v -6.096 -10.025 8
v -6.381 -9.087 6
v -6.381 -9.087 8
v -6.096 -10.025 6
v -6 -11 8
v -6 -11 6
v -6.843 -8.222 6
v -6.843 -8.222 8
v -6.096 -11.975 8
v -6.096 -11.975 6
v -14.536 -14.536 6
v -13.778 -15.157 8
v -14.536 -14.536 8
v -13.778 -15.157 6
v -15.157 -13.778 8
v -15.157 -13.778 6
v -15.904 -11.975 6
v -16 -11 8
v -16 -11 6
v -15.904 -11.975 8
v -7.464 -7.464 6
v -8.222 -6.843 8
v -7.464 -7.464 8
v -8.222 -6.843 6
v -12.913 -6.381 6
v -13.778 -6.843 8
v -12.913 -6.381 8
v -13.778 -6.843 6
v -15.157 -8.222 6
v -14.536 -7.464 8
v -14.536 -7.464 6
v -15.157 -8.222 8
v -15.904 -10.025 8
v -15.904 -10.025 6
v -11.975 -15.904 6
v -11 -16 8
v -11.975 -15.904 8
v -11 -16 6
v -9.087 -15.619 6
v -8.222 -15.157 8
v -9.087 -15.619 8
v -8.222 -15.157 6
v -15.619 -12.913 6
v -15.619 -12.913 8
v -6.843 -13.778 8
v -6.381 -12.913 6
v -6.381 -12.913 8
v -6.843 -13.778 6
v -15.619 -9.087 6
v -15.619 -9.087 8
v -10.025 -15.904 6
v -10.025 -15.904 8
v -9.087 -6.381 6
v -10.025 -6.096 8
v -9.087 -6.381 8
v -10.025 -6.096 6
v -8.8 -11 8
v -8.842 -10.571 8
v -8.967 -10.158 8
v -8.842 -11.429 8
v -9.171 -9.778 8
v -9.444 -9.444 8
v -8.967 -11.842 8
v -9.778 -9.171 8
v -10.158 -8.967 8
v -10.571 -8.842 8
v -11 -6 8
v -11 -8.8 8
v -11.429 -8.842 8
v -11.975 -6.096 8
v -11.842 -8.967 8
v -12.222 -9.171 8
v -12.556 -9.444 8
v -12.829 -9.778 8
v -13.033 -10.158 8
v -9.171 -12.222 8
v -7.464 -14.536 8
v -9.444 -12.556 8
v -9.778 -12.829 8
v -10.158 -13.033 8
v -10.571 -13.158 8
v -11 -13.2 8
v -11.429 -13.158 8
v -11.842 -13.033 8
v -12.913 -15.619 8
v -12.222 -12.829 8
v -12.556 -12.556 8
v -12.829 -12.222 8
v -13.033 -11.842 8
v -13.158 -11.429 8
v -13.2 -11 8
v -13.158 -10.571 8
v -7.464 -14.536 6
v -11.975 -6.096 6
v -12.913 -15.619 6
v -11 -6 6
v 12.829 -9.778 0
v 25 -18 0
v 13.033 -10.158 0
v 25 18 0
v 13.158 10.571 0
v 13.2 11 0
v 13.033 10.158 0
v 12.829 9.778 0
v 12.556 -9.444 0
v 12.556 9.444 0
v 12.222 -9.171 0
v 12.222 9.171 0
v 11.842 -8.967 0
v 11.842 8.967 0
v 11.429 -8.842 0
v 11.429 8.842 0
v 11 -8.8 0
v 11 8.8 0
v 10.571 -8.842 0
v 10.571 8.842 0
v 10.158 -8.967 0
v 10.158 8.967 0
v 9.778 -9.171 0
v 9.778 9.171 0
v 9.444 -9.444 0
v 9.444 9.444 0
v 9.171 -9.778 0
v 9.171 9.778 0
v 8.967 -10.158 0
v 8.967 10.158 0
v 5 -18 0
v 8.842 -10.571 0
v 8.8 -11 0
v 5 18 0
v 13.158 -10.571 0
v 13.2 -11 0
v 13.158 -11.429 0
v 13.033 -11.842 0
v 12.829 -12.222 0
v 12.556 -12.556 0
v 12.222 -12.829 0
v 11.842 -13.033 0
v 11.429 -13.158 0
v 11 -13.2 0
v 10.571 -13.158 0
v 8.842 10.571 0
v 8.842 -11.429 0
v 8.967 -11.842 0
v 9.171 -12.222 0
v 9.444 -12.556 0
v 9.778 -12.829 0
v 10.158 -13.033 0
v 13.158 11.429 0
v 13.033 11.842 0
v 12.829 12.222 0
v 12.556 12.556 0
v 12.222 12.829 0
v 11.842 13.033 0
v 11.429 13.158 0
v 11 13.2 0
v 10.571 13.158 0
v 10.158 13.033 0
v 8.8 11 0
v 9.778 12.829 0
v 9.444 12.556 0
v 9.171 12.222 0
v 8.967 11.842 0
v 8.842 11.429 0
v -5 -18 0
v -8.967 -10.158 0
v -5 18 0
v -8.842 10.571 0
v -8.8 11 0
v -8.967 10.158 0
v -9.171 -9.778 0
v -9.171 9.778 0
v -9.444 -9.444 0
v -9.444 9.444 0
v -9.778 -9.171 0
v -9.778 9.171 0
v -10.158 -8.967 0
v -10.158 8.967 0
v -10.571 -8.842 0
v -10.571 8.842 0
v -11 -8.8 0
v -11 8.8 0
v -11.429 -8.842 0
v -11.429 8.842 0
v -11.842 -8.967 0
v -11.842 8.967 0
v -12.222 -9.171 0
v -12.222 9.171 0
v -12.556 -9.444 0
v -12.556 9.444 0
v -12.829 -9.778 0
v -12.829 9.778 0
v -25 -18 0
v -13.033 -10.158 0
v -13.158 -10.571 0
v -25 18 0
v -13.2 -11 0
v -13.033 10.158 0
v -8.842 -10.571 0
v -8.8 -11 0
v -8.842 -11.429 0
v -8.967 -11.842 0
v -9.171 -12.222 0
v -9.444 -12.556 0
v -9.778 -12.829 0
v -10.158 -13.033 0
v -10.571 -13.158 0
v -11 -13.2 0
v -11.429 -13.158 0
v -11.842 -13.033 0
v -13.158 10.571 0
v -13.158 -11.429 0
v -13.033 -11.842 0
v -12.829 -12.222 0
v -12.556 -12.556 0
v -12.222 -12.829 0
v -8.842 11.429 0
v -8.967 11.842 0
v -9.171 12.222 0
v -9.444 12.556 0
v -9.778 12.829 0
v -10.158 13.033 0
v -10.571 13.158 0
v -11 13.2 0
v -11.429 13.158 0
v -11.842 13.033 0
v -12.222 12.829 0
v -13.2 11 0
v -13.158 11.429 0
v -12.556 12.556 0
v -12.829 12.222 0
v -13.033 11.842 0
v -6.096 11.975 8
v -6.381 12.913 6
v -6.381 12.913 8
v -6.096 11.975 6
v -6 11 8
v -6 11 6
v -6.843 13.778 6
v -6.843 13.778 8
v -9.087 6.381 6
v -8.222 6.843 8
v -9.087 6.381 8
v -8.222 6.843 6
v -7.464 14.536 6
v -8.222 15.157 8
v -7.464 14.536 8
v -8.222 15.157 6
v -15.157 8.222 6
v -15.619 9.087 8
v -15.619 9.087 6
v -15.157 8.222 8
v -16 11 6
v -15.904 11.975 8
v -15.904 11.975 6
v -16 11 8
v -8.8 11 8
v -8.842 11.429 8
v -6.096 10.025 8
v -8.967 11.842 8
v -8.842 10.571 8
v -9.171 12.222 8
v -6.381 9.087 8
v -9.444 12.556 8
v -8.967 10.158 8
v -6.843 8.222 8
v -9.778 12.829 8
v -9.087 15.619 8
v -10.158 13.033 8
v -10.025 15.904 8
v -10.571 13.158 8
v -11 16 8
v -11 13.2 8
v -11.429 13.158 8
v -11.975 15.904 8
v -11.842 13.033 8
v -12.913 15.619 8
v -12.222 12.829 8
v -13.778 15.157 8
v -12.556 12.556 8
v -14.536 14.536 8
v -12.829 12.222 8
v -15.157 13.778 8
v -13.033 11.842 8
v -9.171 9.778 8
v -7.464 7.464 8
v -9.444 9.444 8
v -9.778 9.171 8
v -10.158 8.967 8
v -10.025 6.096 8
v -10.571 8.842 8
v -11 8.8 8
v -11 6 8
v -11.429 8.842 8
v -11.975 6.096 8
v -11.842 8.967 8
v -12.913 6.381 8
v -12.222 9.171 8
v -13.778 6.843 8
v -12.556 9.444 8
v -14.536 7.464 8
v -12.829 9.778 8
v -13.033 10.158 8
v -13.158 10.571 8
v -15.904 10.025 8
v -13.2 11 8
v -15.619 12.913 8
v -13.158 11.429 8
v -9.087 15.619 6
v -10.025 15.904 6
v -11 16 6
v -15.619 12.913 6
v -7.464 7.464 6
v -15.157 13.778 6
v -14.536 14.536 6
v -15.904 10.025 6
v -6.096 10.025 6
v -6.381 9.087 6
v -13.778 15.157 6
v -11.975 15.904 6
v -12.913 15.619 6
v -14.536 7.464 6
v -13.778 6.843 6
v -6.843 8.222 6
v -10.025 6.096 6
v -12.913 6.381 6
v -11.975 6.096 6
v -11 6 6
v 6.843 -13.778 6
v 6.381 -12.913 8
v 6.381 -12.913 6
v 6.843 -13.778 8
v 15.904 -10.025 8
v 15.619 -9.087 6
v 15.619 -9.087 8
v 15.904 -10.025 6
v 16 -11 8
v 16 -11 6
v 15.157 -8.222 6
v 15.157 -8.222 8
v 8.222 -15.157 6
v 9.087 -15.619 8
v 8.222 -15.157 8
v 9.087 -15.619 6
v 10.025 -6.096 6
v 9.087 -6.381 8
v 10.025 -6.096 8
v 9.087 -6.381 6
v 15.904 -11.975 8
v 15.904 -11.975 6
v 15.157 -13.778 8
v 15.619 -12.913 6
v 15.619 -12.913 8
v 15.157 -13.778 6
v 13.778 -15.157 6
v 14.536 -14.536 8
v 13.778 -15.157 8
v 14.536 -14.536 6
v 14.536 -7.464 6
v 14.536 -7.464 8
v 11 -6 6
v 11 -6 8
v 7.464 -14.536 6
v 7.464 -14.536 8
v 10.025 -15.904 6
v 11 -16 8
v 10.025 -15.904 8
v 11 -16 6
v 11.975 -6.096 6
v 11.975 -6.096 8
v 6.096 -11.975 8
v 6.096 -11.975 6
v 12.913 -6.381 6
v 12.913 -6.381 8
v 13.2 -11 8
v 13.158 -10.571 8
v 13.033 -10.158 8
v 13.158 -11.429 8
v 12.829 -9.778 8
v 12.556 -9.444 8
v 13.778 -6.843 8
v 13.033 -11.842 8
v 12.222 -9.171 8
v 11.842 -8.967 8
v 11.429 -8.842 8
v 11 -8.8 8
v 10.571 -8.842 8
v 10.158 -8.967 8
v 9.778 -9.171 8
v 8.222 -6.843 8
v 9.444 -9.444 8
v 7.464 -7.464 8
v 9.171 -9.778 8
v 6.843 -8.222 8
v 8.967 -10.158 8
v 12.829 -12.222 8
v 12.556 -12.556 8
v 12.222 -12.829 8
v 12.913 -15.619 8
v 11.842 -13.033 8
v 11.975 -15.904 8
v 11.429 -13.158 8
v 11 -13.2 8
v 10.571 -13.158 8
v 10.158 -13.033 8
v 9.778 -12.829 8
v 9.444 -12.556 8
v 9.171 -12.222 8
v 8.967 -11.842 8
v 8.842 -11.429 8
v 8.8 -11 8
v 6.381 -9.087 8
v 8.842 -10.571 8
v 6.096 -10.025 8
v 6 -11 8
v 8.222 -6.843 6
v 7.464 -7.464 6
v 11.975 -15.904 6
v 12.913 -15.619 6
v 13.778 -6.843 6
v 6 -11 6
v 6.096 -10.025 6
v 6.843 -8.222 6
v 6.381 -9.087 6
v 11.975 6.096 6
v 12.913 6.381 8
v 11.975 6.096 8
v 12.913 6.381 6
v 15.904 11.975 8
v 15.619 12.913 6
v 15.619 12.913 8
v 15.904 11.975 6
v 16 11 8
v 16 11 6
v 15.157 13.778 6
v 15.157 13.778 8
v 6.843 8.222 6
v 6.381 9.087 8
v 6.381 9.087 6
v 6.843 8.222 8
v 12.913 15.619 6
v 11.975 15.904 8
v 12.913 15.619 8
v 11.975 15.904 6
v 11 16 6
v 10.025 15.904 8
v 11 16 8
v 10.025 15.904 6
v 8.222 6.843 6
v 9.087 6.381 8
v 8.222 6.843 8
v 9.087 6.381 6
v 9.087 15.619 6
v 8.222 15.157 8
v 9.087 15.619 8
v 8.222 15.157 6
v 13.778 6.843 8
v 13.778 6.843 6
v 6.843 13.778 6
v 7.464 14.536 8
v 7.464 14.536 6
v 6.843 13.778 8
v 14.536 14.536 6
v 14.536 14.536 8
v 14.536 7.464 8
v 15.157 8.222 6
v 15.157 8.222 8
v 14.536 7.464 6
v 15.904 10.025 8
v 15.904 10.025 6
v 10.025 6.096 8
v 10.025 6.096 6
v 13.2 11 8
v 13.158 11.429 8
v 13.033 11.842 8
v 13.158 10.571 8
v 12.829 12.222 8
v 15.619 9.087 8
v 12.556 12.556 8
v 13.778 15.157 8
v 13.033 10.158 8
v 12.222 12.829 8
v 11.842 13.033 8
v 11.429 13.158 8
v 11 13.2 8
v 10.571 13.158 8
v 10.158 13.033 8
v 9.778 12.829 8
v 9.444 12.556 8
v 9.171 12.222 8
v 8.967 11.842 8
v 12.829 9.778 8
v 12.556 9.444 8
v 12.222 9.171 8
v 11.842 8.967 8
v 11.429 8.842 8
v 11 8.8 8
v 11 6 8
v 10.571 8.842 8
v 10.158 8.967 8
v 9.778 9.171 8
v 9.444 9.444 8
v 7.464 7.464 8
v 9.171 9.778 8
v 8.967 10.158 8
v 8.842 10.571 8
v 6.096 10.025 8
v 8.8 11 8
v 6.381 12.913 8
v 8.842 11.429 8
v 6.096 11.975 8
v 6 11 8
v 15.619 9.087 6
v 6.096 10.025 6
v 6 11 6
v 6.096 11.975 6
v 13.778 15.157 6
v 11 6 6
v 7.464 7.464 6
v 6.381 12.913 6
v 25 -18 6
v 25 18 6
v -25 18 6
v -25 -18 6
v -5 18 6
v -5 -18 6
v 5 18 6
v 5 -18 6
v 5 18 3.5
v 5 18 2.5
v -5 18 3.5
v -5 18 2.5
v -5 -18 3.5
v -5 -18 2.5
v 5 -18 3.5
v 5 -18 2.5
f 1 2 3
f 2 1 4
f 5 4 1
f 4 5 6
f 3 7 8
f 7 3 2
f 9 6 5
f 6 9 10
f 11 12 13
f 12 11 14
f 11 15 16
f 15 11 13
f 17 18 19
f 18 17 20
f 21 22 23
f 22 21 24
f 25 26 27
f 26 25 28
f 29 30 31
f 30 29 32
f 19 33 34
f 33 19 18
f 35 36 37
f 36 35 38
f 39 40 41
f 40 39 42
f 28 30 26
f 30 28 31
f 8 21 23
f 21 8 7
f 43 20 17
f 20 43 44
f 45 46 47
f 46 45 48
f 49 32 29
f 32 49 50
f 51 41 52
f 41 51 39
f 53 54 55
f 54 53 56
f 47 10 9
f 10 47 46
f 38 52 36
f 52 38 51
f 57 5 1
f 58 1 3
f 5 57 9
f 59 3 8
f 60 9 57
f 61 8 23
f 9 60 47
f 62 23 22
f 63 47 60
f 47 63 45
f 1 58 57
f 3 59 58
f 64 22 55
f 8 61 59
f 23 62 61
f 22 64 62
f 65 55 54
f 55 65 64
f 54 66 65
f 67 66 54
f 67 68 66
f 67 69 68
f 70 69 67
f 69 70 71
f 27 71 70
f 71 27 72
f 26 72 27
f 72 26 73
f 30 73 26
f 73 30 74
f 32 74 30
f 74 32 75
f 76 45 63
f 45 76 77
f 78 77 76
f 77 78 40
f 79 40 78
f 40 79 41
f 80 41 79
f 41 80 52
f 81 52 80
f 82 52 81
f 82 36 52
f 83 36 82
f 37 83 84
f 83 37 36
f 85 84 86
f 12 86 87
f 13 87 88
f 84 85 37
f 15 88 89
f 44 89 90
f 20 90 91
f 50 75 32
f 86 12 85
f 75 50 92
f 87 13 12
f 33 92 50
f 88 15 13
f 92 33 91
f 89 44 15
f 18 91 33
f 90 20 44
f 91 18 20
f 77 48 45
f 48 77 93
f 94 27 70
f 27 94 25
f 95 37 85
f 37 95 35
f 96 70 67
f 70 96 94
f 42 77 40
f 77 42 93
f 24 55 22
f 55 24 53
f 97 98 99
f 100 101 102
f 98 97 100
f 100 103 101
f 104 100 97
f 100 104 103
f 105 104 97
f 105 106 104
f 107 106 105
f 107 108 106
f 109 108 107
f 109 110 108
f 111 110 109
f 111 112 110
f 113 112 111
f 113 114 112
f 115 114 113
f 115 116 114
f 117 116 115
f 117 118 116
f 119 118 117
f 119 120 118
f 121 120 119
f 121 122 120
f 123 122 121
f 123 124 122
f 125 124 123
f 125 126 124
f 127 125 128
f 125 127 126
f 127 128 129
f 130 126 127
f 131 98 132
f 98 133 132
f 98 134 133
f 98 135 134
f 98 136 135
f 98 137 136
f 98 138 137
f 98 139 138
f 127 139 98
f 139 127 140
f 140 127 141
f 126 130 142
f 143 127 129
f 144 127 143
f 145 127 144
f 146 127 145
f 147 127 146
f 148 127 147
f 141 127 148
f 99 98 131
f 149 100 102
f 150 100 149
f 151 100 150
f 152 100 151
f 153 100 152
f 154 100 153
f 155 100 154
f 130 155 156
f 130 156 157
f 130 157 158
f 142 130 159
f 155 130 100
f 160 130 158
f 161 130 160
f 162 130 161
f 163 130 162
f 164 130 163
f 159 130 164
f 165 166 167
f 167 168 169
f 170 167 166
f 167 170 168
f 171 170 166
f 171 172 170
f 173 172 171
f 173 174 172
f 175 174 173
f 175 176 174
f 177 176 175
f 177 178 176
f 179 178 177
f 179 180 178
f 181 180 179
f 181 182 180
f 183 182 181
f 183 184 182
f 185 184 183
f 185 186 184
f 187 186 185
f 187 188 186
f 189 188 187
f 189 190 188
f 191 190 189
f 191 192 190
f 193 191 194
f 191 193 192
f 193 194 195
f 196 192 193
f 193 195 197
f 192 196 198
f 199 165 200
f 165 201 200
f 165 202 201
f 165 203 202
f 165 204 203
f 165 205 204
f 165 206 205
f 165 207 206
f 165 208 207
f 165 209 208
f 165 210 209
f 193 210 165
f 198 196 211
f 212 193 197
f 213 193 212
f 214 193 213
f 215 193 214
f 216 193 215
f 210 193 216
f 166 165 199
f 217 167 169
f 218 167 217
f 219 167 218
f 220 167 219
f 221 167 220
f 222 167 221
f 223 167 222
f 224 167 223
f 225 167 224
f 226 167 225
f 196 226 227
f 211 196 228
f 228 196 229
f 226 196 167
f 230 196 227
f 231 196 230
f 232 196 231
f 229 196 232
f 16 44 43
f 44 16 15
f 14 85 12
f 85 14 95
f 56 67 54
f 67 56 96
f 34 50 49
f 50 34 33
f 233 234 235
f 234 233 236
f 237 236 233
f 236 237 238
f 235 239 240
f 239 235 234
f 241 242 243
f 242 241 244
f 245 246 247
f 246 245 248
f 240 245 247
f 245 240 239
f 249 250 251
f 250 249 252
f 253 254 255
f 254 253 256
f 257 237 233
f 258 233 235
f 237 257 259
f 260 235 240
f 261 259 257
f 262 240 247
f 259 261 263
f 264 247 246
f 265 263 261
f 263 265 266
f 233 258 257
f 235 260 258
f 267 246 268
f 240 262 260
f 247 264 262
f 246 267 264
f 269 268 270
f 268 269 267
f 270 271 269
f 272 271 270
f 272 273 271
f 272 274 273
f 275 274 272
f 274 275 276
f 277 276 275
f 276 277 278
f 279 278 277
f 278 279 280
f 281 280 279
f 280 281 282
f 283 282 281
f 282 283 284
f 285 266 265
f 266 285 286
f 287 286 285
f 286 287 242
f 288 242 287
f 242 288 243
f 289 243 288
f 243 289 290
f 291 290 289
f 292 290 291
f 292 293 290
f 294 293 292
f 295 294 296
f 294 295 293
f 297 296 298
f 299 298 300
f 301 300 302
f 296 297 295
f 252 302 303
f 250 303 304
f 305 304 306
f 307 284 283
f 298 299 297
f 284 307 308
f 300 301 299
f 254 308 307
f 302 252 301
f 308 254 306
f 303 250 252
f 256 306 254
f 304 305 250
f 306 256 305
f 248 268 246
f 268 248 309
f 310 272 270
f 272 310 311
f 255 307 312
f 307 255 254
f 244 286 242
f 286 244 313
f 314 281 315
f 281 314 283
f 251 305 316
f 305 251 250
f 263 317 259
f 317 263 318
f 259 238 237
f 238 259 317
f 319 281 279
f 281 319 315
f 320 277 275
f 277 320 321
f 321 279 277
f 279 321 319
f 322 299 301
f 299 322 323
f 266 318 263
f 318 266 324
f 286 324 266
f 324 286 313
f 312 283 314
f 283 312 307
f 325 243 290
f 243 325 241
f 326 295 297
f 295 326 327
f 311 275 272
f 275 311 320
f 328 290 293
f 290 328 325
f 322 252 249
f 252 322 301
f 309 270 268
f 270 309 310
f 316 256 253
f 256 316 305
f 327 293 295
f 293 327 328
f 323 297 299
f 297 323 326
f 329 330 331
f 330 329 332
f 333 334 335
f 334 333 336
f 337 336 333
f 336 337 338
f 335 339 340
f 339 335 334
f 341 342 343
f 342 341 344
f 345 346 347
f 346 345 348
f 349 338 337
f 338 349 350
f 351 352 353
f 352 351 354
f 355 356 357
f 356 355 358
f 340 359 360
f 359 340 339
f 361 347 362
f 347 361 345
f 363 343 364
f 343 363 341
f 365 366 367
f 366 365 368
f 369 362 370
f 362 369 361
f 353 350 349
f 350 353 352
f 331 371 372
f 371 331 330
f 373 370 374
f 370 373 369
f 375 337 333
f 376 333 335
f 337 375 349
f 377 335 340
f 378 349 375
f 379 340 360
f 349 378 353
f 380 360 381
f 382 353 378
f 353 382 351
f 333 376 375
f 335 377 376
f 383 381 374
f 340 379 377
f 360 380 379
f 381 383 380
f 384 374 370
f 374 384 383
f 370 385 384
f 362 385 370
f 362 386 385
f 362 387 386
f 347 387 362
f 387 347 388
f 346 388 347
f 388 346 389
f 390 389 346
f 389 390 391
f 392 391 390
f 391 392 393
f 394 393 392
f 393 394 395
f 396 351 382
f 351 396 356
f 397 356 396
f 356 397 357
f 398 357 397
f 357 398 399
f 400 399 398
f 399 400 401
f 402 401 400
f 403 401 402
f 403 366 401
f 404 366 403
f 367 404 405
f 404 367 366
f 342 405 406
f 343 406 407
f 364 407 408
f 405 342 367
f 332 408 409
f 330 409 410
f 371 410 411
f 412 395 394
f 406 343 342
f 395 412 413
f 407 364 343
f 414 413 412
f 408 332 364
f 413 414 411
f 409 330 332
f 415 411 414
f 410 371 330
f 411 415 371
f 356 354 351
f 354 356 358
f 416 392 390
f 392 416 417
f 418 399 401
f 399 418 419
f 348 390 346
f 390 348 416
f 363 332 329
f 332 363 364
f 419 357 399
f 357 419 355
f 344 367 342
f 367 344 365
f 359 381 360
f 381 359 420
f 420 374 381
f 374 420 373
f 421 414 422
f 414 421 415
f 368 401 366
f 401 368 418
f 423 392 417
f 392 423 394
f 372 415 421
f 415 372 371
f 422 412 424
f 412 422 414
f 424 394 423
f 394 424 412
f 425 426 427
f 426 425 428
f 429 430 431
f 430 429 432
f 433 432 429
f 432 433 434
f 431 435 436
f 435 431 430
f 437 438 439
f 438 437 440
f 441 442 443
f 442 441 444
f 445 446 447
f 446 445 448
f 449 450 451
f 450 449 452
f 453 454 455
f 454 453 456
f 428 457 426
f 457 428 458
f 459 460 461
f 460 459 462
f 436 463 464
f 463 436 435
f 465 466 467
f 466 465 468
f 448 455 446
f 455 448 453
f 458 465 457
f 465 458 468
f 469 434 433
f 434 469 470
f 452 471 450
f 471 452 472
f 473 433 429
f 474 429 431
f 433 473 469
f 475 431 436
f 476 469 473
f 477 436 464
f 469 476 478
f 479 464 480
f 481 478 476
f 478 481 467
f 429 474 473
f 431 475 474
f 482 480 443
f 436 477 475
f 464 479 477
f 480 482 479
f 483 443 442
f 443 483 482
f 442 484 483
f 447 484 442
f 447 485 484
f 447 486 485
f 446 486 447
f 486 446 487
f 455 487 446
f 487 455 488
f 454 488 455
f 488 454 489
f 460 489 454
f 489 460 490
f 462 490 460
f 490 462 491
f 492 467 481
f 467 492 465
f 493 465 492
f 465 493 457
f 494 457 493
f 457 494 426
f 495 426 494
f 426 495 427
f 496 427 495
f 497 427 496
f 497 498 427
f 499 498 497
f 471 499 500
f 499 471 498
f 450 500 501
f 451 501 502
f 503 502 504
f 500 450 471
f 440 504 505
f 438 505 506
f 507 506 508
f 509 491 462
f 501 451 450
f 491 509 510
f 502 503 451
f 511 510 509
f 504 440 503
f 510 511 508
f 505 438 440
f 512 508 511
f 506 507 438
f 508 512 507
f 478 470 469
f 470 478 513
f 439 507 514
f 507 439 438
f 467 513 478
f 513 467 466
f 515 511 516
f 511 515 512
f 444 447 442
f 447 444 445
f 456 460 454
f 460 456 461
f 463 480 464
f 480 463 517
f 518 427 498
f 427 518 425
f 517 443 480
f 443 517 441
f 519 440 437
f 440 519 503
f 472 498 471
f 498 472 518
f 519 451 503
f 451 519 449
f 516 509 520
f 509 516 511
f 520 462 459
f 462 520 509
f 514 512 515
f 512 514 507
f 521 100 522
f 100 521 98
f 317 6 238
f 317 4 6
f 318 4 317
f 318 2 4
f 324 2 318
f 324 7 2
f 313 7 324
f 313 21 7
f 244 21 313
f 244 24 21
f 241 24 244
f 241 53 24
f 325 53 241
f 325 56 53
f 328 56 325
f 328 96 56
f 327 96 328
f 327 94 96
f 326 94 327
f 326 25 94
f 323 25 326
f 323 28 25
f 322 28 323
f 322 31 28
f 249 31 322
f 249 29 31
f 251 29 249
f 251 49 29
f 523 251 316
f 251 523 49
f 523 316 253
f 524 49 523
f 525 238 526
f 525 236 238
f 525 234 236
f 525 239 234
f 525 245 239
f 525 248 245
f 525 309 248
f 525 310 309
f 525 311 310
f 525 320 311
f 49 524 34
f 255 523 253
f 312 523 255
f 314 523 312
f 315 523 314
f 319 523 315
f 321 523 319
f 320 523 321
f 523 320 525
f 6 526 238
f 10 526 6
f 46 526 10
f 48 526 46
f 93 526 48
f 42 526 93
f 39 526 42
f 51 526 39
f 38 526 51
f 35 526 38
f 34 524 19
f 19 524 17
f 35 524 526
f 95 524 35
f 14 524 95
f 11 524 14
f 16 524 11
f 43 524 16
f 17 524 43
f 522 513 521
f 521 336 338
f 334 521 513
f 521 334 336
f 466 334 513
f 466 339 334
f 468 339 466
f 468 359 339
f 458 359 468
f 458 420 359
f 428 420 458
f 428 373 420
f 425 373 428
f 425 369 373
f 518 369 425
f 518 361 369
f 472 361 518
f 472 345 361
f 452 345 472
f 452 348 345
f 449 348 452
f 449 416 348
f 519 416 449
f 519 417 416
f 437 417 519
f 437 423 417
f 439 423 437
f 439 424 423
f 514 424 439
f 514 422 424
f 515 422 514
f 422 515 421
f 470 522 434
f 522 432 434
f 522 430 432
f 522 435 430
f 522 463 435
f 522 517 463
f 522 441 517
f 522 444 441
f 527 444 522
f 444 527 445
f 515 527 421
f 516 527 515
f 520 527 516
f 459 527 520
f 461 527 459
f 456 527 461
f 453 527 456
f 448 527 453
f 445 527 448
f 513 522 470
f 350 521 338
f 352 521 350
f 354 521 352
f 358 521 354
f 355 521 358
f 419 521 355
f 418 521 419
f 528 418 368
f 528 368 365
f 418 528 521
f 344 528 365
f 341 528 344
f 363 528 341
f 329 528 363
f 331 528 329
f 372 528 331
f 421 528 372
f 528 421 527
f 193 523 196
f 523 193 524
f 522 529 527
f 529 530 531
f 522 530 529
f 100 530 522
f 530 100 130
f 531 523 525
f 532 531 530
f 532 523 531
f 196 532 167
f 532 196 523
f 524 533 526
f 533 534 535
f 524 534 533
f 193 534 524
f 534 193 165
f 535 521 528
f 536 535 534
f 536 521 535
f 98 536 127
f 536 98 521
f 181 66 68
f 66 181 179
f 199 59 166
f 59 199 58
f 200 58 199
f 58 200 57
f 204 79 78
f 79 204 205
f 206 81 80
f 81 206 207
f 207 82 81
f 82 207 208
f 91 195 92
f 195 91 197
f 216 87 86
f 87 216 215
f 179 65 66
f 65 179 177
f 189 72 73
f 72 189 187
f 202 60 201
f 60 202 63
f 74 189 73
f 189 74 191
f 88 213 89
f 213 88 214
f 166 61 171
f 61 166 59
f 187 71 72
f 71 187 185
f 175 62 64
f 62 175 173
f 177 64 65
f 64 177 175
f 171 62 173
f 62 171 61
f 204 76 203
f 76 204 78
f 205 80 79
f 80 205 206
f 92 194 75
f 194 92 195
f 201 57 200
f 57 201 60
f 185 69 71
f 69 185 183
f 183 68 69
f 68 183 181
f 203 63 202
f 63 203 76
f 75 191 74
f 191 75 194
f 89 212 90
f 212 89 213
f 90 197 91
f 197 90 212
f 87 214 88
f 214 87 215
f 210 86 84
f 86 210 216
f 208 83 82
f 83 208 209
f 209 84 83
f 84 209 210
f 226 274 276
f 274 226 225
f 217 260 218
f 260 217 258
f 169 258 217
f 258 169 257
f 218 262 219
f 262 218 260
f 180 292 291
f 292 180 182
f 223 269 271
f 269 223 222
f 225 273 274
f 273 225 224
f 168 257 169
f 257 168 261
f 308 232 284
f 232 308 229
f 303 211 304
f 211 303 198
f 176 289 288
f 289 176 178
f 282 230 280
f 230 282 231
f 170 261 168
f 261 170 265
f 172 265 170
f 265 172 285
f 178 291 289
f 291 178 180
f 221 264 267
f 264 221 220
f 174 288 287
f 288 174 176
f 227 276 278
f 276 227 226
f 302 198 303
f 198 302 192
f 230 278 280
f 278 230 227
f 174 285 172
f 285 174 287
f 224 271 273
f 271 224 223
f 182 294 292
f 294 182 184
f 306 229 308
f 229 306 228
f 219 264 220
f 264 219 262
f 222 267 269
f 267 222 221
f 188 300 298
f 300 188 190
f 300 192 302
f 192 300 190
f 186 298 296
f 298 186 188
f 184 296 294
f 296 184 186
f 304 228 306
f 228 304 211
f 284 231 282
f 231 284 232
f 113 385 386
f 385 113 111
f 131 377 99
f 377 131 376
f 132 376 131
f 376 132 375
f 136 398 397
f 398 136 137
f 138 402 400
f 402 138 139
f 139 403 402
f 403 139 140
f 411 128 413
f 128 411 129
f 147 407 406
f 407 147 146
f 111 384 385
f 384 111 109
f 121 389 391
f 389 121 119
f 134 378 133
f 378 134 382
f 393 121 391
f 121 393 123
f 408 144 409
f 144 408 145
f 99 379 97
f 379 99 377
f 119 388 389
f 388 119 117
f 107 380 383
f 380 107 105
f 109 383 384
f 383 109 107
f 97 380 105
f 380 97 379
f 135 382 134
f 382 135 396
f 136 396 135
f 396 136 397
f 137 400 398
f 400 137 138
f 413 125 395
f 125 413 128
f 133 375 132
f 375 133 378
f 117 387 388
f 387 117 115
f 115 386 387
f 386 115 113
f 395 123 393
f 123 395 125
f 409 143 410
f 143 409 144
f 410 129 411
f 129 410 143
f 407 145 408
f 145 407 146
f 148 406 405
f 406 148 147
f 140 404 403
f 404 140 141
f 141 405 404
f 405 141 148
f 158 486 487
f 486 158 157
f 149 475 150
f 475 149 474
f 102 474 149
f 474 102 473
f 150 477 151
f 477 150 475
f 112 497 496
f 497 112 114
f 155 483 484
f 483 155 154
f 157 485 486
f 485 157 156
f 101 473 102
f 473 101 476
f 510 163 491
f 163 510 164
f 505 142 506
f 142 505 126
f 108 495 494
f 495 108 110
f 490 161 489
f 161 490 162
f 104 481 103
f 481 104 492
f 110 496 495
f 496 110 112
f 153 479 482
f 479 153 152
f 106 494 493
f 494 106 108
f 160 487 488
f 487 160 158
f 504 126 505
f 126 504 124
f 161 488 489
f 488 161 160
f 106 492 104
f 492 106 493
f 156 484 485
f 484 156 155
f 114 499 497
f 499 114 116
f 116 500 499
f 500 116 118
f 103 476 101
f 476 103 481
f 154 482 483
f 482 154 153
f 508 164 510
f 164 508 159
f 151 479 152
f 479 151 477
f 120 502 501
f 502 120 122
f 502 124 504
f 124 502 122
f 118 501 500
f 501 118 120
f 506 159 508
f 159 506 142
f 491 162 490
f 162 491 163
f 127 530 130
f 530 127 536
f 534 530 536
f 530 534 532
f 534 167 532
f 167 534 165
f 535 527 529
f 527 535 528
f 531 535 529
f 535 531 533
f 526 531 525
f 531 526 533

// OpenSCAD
$fn = 32;

// ----------------------------------------------------------------------
// Living hinge: 50 x 36 mm plates, 1 mm flexible web
// ----------------------------------------------------------------------

// --- parameters (mm) ---
plate_len = 20;           // plate length outside the web
plate_w = 36;             // plate width
thick = 6;                // plate thickness
web_half = 5;             // half width of the flex band
web_t = 1;                // flexible web thickness
web_z = 2.5;              // web position inside the thickness
boss_d = 10;              // screw boss diameter
boss_h = 8;               // screw boss height
boss_x = 11;              // screw boss distance from the web
screw_d = 4.4;            // screw hole

difference() {
  union() {
    /* one flat strip, later thinned at the middle */
    translate([-25, -18, 0]) cube([50, 36, 6]);
    /* screw bosses, sunk 0.5 mm into the plates */
    for (sx = [-11, 11]) {
      for (sy = [-11, 11]) {
        translate([sx, sy, 0]) cylinder(h = boss_h, d = boss_d);
      }
    }
  }
  /* channel from below: leaves the web on top of it */
  translate([-5, -20.5, -2.5]) cube([10, 41, 5]);
  /* channel from above: thins the web down to web_t */
  translate([-5, -20.5, 3.5]) cube([10, 41, 5]);
  /* screw holes through the bosses */
  for (sx = [-11, 11]) {
    for (sy = [-11, 11]) {
      translate([sx, sy, -2.5]) cylinder(h = boss_h + 5, d = screw_d);
    }
  }
}
